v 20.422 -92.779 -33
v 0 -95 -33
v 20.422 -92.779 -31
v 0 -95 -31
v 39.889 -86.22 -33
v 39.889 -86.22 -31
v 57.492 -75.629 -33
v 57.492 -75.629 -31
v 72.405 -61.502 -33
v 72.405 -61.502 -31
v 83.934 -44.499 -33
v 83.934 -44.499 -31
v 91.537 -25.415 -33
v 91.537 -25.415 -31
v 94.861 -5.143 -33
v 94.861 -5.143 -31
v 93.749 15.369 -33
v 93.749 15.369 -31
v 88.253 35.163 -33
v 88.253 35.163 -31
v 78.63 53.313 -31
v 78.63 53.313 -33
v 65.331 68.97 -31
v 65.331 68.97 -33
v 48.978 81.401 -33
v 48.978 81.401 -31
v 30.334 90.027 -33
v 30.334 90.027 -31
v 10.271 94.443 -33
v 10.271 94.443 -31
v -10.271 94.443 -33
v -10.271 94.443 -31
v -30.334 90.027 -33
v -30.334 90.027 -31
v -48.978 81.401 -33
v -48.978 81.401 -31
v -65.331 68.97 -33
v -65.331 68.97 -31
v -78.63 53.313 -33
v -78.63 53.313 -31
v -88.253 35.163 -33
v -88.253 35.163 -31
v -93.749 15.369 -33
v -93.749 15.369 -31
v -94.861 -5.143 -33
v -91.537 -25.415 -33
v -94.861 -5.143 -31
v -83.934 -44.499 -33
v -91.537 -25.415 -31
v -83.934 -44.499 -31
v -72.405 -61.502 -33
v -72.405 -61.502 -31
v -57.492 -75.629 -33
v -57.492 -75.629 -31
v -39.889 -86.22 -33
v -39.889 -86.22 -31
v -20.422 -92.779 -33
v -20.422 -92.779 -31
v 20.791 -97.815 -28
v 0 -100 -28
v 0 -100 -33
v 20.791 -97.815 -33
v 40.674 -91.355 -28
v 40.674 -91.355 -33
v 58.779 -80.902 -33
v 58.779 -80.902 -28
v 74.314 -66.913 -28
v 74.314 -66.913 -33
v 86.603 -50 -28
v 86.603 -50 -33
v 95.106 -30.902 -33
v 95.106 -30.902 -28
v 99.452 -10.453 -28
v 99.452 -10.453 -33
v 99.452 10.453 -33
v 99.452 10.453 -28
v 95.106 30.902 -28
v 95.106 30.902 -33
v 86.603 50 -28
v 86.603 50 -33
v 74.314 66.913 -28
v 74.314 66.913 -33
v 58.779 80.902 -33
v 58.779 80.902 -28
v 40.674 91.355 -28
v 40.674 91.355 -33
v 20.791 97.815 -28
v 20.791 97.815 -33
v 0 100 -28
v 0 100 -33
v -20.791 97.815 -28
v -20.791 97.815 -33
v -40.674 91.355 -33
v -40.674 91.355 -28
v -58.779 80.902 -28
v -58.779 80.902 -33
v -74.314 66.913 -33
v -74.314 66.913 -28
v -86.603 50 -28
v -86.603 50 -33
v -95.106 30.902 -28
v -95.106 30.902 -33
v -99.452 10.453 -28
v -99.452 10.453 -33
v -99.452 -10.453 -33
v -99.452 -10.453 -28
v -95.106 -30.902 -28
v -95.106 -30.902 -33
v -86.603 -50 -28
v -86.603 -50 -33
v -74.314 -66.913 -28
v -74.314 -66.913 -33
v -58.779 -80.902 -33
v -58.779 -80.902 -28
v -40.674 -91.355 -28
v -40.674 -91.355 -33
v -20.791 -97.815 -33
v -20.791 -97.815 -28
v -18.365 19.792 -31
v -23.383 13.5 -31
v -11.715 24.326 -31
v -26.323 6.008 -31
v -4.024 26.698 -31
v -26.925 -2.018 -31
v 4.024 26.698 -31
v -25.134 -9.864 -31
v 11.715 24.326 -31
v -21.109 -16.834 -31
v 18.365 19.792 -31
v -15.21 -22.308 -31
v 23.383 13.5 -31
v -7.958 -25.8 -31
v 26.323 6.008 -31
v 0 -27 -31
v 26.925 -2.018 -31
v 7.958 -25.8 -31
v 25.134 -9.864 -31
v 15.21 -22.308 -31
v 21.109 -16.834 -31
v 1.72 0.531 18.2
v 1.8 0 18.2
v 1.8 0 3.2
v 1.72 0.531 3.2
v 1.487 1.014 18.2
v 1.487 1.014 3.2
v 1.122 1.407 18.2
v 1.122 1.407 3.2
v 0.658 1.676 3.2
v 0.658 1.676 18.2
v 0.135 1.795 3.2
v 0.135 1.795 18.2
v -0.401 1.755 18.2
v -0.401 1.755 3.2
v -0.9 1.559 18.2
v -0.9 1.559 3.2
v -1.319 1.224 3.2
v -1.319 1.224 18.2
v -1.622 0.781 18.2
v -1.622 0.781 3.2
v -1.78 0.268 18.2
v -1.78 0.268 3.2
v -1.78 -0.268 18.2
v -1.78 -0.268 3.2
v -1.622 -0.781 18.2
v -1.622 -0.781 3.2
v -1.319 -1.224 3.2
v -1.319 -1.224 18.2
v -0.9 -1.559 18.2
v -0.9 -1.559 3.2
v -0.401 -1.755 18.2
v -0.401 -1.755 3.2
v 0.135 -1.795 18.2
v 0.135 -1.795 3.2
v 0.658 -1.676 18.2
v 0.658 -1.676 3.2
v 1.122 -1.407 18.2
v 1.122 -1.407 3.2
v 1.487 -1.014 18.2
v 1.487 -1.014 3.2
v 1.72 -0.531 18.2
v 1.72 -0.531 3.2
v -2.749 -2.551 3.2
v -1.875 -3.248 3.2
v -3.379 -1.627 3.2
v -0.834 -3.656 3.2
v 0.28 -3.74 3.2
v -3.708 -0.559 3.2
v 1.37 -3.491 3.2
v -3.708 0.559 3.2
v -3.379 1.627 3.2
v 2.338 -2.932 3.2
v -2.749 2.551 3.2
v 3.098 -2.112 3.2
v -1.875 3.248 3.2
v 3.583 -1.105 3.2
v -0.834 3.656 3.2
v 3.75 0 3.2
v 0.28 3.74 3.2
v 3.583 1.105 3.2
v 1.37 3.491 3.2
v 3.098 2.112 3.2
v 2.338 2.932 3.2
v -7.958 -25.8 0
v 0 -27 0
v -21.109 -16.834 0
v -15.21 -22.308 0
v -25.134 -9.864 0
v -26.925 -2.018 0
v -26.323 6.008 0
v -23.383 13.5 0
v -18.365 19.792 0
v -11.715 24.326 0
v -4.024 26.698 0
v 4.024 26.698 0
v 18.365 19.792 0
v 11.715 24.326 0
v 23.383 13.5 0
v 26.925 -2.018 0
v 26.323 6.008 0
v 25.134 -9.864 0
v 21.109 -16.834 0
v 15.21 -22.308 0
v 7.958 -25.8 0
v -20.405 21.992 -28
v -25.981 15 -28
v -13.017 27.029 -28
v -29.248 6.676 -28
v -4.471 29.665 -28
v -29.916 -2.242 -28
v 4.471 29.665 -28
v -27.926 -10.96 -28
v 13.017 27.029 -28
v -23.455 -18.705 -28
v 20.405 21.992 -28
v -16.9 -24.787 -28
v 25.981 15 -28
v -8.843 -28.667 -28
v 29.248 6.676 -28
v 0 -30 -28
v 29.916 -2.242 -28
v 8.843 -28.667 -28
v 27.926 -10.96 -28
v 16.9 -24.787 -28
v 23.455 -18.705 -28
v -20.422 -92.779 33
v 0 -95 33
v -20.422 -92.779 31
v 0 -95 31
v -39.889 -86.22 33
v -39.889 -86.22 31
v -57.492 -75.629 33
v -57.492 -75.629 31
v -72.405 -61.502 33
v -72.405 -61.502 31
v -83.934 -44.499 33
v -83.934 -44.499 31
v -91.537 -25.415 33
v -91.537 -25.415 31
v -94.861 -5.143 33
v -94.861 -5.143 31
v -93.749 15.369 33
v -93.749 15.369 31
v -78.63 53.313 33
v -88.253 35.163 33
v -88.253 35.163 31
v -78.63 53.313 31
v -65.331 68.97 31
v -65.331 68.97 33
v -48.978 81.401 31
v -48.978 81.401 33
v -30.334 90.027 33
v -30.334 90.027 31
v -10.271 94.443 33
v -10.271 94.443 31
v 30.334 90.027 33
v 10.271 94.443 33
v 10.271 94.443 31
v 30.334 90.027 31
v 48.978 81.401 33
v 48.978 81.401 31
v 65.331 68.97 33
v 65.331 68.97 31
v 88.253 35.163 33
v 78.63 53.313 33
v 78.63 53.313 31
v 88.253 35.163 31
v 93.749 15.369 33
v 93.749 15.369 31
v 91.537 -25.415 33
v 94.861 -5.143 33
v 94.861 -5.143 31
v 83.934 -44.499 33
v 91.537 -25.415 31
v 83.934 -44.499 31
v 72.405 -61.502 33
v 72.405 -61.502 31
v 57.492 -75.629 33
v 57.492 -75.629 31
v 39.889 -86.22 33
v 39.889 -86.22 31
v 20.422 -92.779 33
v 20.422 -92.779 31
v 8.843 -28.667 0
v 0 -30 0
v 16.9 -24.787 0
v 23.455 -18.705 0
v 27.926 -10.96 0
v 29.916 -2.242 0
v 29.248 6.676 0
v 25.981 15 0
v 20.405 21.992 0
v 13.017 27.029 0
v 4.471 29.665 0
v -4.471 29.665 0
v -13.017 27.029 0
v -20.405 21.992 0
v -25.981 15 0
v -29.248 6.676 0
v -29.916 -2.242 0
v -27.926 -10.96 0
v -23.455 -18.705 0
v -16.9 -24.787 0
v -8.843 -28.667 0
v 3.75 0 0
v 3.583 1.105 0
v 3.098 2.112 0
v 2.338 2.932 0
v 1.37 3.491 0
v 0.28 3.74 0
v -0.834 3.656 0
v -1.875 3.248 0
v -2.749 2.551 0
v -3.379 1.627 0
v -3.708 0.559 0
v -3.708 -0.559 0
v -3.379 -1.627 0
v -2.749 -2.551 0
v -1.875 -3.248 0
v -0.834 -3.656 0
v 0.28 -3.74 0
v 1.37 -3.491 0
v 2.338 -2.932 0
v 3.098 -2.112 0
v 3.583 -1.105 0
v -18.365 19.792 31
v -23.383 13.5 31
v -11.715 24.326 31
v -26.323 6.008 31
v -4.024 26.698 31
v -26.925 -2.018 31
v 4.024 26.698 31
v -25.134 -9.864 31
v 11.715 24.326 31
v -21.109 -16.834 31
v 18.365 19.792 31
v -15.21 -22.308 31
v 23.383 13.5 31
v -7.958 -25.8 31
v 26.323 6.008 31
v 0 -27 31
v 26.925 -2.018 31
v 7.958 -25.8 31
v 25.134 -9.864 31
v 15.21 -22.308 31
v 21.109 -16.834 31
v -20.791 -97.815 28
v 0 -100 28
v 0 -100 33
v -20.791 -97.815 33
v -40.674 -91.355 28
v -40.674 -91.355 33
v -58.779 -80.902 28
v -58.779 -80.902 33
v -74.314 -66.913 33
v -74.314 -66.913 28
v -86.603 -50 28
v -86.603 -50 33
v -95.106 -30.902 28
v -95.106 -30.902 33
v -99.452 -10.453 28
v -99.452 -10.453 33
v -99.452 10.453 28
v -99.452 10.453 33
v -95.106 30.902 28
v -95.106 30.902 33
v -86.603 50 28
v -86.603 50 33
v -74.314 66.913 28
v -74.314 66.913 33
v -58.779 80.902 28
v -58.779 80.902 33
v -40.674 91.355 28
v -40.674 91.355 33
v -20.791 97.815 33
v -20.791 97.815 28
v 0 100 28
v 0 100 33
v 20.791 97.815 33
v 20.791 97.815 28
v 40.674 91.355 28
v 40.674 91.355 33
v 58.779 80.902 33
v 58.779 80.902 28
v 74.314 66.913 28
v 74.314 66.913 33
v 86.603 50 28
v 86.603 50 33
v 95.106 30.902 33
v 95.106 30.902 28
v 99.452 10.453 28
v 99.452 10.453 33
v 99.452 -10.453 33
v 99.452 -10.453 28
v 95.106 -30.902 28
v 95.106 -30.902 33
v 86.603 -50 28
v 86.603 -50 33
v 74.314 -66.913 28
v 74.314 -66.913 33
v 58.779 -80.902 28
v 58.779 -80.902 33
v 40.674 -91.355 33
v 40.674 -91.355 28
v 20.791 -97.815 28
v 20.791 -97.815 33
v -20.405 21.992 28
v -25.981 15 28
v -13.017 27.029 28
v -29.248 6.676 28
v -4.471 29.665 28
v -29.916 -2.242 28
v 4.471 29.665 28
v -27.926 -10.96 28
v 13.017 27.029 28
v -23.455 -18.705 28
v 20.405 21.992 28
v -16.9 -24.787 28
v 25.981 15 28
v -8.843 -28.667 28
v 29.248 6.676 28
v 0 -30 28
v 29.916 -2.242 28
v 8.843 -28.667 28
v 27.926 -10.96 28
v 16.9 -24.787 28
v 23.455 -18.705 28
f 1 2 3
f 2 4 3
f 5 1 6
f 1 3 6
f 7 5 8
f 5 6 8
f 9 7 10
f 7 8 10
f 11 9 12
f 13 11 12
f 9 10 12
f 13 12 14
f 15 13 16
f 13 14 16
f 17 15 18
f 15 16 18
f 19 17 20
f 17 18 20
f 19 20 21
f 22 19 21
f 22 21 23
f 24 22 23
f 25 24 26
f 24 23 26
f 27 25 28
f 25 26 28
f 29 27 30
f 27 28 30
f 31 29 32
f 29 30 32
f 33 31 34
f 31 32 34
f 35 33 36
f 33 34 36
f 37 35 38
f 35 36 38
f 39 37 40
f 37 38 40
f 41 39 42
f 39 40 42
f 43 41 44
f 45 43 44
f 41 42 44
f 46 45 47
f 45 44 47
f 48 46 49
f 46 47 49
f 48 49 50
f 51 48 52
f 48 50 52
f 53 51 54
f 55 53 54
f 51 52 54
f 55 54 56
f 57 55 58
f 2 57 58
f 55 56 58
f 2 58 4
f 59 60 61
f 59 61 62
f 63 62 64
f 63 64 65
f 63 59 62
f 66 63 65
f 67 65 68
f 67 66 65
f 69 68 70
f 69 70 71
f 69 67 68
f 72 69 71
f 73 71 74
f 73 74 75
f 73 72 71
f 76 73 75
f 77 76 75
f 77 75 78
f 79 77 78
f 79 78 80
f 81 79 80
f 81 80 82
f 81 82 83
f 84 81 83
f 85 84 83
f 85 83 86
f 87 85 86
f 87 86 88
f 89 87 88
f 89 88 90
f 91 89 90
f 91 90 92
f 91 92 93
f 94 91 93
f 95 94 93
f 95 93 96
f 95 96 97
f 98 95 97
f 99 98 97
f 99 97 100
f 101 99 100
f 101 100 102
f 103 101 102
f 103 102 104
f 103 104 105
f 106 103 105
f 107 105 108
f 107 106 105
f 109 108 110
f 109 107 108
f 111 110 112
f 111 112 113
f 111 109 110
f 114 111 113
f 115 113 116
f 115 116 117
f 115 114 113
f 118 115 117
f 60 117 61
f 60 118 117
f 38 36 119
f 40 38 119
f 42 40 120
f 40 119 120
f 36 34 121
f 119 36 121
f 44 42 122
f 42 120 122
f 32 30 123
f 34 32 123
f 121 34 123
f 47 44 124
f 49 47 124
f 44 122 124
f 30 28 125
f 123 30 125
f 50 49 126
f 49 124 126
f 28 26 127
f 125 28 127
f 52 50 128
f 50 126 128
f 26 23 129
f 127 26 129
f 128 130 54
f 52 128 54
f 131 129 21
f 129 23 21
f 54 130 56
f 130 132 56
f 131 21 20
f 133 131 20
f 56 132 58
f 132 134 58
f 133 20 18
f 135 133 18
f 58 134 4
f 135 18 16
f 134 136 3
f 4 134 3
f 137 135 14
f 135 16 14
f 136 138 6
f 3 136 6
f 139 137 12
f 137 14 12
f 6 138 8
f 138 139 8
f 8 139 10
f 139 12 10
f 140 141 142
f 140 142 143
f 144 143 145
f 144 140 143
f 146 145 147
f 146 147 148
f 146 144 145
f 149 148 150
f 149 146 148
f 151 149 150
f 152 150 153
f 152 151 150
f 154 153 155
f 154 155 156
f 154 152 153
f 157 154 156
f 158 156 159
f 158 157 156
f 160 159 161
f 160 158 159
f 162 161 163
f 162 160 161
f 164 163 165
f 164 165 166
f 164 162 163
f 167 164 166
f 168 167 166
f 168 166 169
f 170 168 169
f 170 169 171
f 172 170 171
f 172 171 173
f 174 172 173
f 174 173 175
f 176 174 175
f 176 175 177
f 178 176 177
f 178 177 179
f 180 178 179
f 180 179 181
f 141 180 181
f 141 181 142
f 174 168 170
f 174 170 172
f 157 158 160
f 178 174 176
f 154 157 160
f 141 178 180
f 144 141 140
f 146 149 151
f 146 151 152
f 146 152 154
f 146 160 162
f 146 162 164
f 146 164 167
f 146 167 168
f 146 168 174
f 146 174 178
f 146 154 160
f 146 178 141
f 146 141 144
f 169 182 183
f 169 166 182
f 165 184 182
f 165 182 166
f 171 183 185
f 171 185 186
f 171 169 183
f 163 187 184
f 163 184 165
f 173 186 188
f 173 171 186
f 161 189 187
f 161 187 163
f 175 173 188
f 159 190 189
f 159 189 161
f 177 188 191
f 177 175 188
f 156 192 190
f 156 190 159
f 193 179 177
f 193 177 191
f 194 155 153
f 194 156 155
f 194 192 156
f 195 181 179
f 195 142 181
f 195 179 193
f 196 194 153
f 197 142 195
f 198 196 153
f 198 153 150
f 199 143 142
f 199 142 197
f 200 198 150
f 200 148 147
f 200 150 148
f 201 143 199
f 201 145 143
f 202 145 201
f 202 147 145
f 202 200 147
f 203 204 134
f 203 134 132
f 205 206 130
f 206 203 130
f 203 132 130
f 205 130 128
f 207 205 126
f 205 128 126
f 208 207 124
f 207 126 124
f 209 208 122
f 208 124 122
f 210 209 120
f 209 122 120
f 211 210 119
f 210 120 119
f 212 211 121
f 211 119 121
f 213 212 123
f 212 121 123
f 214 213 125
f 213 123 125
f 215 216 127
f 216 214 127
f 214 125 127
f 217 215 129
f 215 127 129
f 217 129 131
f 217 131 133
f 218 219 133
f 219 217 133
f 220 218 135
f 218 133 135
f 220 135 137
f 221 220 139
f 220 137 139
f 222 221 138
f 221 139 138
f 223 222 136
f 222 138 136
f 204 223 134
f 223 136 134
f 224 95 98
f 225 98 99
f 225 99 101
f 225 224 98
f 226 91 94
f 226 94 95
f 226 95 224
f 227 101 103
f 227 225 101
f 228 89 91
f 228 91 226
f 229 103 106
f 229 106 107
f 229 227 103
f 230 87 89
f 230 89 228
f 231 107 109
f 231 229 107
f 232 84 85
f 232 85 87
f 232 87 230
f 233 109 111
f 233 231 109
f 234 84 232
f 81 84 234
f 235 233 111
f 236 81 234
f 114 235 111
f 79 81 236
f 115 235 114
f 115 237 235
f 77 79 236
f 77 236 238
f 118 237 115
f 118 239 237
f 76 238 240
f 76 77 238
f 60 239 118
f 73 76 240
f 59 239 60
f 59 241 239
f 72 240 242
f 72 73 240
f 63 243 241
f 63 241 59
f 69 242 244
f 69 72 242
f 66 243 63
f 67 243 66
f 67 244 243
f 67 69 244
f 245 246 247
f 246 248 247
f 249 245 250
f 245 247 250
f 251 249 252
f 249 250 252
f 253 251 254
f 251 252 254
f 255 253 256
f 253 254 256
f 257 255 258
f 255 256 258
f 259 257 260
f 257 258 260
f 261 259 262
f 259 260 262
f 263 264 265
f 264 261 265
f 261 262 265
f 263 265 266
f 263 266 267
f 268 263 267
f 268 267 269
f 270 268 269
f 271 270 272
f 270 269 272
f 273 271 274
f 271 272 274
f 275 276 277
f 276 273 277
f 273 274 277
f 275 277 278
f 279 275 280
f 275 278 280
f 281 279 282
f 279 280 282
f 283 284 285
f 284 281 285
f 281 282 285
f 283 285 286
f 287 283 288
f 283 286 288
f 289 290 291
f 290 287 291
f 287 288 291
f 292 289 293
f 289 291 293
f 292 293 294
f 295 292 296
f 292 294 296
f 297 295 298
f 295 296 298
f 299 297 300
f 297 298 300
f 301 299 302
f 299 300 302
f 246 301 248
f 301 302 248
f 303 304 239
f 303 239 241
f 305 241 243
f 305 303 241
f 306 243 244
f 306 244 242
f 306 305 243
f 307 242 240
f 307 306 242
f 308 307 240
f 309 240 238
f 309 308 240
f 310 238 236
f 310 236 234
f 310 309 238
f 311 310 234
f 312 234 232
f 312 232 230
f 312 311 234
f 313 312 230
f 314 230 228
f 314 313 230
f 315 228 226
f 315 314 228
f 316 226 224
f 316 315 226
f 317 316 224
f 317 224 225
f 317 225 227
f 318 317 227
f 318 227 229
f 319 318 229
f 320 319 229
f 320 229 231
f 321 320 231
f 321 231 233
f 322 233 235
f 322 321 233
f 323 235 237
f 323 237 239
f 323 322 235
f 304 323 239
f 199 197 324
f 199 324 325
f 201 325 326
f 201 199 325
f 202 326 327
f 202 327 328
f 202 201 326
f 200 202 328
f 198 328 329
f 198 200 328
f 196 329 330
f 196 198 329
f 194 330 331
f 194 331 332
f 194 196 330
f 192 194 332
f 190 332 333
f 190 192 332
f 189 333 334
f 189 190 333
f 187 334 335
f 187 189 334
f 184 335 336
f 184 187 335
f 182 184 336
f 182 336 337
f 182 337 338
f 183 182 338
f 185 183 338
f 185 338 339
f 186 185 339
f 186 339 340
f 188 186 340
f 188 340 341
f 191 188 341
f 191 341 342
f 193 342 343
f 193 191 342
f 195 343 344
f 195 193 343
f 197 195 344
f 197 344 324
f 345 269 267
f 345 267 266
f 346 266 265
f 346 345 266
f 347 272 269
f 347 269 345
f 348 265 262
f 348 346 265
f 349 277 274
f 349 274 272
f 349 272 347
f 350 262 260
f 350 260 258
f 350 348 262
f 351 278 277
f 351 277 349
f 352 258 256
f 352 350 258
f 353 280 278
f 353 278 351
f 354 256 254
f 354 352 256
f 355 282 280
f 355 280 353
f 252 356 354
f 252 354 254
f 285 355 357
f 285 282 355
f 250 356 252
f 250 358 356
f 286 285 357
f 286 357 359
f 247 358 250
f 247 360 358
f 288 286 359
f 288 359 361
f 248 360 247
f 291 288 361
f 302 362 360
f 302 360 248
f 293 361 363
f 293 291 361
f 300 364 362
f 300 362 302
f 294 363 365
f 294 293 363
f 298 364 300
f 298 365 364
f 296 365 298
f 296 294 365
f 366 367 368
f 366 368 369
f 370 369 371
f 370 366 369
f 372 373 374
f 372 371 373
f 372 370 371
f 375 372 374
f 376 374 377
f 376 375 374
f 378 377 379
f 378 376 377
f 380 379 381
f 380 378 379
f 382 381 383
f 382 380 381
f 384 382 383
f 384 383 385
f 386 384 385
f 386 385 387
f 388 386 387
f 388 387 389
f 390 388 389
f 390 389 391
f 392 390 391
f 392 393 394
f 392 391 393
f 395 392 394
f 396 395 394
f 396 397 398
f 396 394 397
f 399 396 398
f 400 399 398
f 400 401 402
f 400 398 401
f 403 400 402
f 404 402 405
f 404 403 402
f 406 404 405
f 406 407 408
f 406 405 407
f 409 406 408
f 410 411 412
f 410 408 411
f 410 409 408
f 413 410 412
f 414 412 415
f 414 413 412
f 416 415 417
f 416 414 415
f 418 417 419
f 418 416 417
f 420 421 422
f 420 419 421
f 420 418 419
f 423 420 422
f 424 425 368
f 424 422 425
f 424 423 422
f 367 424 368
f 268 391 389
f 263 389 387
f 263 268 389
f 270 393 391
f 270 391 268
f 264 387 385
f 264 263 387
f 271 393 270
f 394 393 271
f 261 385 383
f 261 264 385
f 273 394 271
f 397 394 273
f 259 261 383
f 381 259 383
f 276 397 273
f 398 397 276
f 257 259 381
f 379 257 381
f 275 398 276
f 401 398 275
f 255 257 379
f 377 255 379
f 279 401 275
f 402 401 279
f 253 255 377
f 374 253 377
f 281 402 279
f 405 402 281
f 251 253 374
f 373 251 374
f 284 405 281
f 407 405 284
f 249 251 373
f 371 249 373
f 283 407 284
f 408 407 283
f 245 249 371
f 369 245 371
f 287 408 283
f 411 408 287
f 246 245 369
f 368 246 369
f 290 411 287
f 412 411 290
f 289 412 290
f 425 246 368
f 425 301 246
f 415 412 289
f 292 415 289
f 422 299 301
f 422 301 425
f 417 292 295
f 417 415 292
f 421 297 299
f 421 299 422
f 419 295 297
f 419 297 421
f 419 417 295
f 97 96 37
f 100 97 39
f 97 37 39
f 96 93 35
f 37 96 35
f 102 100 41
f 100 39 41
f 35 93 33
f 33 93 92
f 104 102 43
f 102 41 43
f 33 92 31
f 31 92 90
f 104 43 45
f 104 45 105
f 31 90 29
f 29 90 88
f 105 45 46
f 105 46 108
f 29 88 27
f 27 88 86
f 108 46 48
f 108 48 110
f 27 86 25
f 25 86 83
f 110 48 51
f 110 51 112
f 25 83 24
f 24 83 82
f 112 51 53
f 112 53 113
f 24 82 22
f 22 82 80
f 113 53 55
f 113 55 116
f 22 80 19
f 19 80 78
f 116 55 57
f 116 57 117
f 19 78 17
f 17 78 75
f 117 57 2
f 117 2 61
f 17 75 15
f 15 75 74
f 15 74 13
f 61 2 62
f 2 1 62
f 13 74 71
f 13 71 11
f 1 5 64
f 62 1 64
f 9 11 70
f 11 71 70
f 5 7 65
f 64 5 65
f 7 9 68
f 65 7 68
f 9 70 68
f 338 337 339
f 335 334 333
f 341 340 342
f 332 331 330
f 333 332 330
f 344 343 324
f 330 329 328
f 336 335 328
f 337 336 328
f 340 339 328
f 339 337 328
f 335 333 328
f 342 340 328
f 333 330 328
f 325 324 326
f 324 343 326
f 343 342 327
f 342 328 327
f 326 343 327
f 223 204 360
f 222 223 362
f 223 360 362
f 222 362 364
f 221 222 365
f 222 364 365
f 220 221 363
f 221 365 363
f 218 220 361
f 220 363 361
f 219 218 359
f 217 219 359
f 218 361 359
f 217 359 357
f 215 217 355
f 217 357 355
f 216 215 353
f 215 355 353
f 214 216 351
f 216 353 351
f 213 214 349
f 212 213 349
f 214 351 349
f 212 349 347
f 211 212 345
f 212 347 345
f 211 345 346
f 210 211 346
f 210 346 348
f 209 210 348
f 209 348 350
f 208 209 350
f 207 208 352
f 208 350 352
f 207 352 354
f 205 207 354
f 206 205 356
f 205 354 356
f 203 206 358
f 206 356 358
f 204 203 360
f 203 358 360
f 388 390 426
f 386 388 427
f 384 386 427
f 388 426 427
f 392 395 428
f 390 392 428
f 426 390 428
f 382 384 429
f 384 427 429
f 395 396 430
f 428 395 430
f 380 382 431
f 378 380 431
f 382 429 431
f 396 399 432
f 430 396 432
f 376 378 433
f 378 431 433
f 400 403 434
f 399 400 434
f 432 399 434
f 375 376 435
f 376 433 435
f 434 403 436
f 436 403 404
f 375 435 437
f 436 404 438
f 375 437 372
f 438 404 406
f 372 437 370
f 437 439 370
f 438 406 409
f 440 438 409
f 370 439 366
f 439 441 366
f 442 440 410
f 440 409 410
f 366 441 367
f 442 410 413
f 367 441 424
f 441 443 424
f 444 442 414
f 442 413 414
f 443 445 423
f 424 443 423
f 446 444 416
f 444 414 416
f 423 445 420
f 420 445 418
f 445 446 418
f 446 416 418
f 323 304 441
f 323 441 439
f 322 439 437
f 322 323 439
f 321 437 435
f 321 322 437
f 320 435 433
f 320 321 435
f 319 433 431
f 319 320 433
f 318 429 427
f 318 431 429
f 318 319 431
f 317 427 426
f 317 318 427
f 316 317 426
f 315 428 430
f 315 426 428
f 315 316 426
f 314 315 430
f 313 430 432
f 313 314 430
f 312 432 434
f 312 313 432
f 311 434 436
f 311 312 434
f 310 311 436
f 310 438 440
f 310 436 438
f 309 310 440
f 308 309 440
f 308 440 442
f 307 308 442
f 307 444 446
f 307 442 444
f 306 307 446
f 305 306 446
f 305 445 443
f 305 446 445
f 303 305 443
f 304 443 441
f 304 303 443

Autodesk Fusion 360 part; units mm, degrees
cylinder "CylinderPrimitive1" add diameter 7.5 height 3.2 placed x (1, 0, 0) y (0, 1, 0) z (0, 0, 1) at (0, 0, 0)
cylinder "CylinderPrimitive2" add diameter 3.6 height 15 placed x (1, 0, 0) y (0, 1, 0) z (0, 0, 1) at (0, 0, 3.2)

Autodesk Fusion 360 part; units mm, degrees
sketch "Spool" plane through (0, 0, 0) normal (1, 0, 0) x (0, 0, -1)
  line L0 (33, -100) -> (28, -100)
  line L1 (28, -100) -> (28, -30)
  line L2 (10, 0) -> (0, 0) construction
  line L3 (33, -100) -> (33, -95)
  line L4 (33, -95) -> (31, -95)
  line L5 (31, -95) -> (31, -27)
  line L6 (0, -27) -> (0, -87.6876) construction
  line L7 (0, -27) -> (31, -27)
  line L8 (28, -30) -> (0, -30)
  line L9 (-33, -100) -> (-28, -100)
  line L10 (-28, -100) -> (-28, -30)
  line L11 (-28, -30) -> (0, -30)
  line L12 (0, -27) -> (-31, -27)
  line L13 (-31, -95) -> (-31, -27)
  line L14 (-33, -100) -> (-33, -95)
  line L15 (-33, -95) -> (-31, -95)
  line L16 (0, 10) -> (0, 0) construction
  dimension "d17" = 5
  dimension "d18" = 100
  dimension "d20" = 27
  dimension "d24" = 28
  dimension "d37" = 3
  dimension "d44" = 33
  dimension "d46" = 2
revolve "Revolve1" add sketch "Spool" angle 360 about axis through (0, 0, -10) along (0, 0, 1)
ref_plane "WorkPlane1" through (0, 0, 0) normal (0, 0, 1) x (1, 0, 0)
equation "d18 = 0.5 * SpoolDia"
equation "d20 = 0.5 * HubDia"
equation "d24 = 0.5 * InsideHeight"
equation "d37 = Thickness"
equation "SpoolDia = 200 mm"
equation "HubDia = 54 mm"
equation "TotalHeight = 66 mm"
equation "d44 = 0.5 * TotalHeight"
equation "LipSize = 2 mm"
equation "d46 = LipSize"
equation "InsideHeight = 56 mm"
equation "Thickness = 0.5 * ( TotalHeight - InsideHeight ) - LipSize"

Autodesk Fusion 360 part; units mm, degrees
cylinder "CylinderPrimitive1" add diameter 7.5 height 3.2 placed x (1, 0, 0) y (0, 1, 0) z (0, 0, 1) at (0, 0, 0)
cylinder "CylinderPrimitive2" add diameter 3.2 height 15 placed x (1, 0, 0) y (0, 1, 0) z (0, 0, 1) at (0, 0, 3.2)
